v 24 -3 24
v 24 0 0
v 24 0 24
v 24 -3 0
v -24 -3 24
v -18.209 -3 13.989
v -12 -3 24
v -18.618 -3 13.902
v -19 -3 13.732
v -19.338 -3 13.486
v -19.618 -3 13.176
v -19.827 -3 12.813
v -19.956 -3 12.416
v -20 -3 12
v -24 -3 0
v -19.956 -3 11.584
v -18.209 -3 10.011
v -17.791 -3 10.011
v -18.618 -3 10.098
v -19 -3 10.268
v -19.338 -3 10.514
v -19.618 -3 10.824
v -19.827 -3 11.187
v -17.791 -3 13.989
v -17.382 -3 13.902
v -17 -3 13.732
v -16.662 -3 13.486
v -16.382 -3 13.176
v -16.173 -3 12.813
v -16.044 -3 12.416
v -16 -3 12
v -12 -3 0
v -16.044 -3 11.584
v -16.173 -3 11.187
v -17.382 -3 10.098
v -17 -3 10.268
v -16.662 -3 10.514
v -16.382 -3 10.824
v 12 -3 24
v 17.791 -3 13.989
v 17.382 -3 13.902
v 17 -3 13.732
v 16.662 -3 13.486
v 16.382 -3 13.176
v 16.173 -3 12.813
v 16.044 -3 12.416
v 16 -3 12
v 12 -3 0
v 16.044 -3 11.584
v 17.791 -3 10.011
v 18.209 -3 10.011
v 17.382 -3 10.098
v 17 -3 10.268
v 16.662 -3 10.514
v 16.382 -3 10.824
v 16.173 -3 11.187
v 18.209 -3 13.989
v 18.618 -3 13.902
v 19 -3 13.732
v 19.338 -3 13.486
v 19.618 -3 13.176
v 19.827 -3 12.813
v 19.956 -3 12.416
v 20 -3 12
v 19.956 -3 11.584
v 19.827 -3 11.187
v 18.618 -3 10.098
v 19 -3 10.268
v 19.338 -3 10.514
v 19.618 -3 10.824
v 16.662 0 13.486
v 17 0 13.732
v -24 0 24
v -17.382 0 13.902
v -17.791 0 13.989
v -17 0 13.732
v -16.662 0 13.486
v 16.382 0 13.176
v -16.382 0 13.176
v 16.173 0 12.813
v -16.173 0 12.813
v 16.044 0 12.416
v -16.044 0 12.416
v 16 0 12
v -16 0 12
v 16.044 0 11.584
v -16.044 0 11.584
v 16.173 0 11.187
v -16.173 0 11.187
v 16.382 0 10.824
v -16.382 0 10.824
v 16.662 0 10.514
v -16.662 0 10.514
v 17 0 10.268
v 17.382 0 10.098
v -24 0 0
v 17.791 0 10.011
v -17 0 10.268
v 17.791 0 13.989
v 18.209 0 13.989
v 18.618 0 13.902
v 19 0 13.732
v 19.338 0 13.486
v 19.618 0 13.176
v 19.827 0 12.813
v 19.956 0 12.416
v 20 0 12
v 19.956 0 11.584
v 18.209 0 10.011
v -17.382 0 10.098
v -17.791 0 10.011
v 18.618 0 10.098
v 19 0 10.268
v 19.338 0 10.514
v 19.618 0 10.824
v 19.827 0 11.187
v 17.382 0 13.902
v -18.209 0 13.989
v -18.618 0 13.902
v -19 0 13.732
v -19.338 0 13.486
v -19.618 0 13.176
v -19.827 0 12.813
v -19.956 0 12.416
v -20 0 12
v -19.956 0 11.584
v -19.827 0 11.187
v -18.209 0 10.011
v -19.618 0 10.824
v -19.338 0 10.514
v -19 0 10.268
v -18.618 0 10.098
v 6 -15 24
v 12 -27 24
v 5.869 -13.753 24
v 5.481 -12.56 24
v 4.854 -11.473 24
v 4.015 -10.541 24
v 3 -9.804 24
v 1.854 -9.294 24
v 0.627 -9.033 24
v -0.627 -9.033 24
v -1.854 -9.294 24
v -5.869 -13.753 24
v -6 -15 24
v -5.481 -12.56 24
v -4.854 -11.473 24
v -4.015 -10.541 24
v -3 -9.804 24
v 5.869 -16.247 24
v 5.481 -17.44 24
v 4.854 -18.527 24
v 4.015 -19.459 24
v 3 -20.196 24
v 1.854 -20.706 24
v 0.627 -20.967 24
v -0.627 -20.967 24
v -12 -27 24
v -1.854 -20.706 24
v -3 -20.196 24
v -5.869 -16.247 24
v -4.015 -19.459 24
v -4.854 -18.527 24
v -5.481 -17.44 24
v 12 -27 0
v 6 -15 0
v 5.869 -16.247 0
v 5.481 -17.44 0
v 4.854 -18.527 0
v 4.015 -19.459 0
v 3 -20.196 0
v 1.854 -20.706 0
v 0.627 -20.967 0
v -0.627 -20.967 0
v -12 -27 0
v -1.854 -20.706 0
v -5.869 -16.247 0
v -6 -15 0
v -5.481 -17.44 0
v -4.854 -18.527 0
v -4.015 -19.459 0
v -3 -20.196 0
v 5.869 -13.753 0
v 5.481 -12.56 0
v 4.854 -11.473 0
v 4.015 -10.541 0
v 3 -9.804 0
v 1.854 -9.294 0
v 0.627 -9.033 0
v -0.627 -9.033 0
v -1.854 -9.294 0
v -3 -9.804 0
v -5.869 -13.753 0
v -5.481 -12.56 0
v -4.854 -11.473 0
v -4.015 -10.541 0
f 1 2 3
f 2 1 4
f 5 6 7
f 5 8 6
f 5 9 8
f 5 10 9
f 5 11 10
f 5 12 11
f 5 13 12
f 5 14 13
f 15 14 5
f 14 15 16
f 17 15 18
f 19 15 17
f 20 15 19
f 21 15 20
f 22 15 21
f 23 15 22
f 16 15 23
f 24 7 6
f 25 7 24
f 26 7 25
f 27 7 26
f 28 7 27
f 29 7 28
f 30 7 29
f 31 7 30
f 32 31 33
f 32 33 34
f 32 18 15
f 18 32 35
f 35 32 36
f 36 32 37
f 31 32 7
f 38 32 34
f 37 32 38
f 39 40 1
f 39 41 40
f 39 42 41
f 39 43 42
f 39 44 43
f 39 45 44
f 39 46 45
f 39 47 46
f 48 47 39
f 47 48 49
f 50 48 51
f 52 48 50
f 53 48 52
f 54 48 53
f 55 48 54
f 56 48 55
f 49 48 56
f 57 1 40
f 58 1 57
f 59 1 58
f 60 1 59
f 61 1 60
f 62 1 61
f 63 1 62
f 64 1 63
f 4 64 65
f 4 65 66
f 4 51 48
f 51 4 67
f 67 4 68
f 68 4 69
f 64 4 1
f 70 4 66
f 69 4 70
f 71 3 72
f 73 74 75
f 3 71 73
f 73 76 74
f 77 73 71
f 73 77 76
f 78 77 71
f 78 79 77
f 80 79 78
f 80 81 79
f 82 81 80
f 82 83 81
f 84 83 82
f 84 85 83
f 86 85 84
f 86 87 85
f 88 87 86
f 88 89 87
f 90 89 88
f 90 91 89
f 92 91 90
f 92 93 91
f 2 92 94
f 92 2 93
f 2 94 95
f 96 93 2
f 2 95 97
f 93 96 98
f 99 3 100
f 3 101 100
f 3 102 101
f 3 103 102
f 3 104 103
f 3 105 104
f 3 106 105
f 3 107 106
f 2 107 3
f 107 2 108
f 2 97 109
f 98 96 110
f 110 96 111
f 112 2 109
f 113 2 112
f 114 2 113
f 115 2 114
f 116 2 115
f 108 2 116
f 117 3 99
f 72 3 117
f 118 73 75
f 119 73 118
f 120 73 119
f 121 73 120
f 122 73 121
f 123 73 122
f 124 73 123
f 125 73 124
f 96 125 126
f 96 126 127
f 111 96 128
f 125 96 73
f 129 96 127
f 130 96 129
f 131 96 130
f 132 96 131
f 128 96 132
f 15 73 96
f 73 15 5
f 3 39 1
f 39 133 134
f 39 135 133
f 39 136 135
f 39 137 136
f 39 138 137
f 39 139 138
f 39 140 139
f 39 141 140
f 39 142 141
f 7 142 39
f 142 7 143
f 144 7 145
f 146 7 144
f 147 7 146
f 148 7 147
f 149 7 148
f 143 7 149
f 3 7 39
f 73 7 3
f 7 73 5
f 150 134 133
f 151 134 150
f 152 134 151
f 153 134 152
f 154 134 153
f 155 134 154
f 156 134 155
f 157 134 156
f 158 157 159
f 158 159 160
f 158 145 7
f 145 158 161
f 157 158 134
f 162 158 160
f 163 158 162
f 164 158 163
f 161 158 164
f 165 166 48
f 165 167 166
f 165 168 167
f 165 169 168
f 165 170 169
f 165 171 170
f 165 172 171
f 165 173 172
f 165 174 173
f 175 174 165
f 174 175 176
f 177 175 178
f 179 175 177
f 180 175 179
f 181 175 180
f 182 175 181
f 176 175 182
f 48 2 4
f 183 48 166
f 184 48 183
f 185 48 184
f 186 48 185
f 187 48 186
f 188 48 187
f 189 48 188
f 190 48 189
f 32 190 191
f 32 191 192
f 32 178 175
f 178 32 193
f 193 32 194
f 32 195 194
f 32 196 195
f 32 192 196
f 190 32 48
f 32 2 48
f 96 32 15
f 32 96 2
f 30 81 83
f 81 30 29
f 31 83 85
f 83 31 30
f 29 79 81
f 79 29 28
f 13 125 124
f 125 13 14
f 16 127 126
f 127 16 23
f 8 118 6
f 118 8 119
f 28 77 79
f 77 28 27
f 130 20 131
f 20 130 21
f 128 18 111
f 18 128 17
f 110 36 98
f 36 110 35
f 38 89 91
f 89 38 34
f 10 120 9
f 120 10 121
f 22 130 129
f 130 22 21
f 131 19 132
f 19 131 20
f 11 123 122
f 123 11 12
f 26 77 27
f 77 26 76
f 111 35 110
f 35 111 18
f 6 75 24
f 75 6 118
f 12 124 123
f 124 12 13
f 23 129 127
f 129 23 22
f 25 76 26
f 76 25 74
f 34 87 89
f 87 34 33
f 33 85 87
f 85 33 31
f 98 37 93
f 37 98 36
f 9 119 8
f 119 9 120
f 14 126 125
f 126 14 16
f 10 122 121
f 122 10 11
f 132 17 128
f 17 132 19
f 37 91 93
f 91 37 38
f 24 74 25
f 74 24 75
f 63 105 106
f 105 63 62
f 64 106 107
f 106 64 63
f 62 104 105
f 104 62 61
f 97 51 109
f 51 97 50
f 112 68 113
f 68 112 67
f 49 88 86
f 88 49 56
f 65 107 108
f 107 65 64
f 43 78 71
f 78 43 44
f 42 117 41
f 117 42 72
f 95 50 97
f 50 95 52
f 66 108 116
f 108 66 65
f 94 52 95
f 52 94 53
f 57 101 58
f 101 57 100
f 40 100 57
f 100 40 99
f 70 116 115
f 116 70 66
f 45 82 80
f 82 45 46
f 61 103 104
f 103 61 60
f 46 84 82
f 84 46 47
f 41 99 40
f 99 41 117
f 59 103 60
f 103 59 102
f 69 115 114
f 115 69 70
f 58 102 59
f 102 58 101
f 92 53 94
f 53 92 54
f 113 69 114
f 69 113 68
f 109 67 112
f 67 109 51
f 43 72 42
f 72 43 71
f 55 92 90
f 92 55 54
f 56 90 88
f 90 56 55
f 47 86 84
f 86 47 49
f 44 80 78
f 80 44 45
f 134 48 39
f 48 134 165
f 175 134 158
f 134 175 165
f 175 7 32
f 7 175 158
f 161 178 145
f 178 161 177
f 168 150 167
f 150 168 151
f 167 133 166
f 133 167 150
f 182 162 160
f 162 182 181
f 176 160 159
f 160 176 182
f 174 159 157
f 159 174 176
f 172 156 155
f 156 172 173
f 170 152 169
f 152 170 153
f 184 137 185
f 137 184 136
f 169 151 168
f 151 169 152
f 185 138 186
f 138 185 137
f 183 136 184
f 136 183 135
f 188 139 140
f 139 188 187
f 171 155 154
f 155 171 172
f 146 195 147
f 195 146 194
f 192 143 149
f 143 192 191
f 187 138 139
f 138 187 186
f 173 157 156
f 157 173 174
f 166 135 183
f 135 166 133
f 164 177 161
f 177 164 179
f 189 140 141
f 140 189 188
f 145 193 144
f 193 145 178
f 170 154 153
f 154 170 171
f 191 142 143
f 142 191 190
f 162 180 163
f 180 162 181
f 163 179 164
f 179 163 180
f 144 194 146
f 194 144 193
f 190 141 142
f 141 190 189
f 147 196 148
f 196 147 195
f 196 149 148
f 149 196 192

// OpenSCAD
// file: common.scad
/*--------------------------------------------------------------------------*
* Sizes and common routines for the CNC parts
*---------------------------------------------------------------------------*
* 13-Jul-2014 ShaneG
*
* First set of definitions using the components I have to experiment with.
*--------------------------------------------------------------------------*/

//---------------------------------------------------------------------------
// Common definitions
//---------------------------------------------------------------------------

RESOLUTION  = 0.1; // Resolution of your printer

PANEL_DEPTH = 3.0; // The prefered size of any shell material

BOLT_SIZE = 4.0; // Diameter of connecting bolts (M4)

BED_TO_MOUNT = 15.0;

GUIDE_ROD_DIAMETER = 12.00;

BEARING_DIAMETER = 22.00;
BEARING_HEIGHT   = 7.00;

//---------------------------------------------------------------------------
// Nuts
//---------------------------------------------------------------------------

/* Hex Nut
**
** Dimensios for a hex nut. The 'outer' diameter (ie: straight side to
** parallel straight side) of the nut does not seem very consistent -
** measurements indicate a 0.5mm range of error across nuts.
*/

NUT_OUTER_DIAMETER = 13.00;
NUT_INNER_DIAMETER = 8.50;  // Enough room for the bore and thread
NUT_HEIGHT         = 6;

/** Create a hexagon.
 *
 * The 'length' parameter specifies the distance from the center of the
 * hexagon to the center of one of the six straight edges. The 'depth'
 * parameter specifies the size in the Z axis. The resulting object
 * is centered on the origin.
 */
module hexagon(length, depth = 2) {
  width = 2 * length * tan(30);
  union() {
    cube(size = [ length * 2, width, depth ], center = true);
    rotate(a = [ 0, 0, 60 ]) {
      cube(size = [ length * 2, width, depth ], center = true);
      }
    rotate(a = [ 0, 0, -60 ]) {
      cube(size = [ length * 2, width, depth ], center = true);
      }
    }
  }

/** Create a hex nut object
 *
 * This function creates a hex nut (centered on the origin) that contains a
 * hole through the center.
 */
module hexnut(depth = NUT_HEIGHT) {
  difference() {
    hexagon(NUT_OUTER_DIAMETER / 2, depth);
    cylinder(h = 2 * depth, r = NUT_INNER_DIAMETER / 2, center = true, $fs = RESOLUTION);
    }
  }

/** Create a negative hex nut object
 *
 * This function creates a hex nut (centered on the origin) that can be subtracted
 * from another shape to allow a hole for the nut to fit into.
 */
module hexnut_negative(depth = NUT_HEIGHT, spindle = NUT_HEIGHT) {
  union() {
    hexagon(NUT_OUTER_DIAMETER / 2, depth);
    cylinder(h = max(2 * depth, spindle), r = NUT_INNER_DIAMETER / 2, center = true, $fs = RESOLUTION);
    }
  }
// main file
/*--------------------------------------------------------------------------*
* X dimension mount connectors
*---------------------------------------------------------------------------*
* 13-Jul-2014 ShaneG
*
* The connector in the X dimension
*--------------------------------------------------------------------------*/
include <common.scad>;

//--- Common definitions
STEM_WIDTH  = GUIDE_ROD_DIAMETER * 2; // Width (in X) of the stem
STEM_HEIGHT = GUIDE_ROD_DIAMETER * 2; // Height (in Y) of the stem
STEM_DEPTH  = BED_TO_MOUNT + GUIDE_ROD_DIAMETER;

//---------------------------------------------------------------------------
// Helper modules
//---------------------------------------------------------------------------

/** Create the base
 *
 * The base needs to provide enough space for two connecting bolts and a
 * stem. The resulting object is centered around the Z axis and vertical
 * based at Z = 0.
 */
module baseplate() {
  plate_width = STEM_WIDTH + (6 * BOLT_SIZE);
  plate_height = max(STEM_HEIGHT, 3 * BOLT_SIZE);
  difference() {
    // Create the base plate
    translate(v = [ 0, 0, PANEL_DEPTH / 2 ]) {
      cube(size = [ plate_width, plate_height, PANEL_DEPTH ], center = true);
      }
    // Cut holes for the bolts
    translate(v = [ -((plate_width / 2) - (1.5 * BOLT_SIZE)), 0, 0 ]) {
      cylinder(h = PANEL_DEPTH * 4, r = BOLT_SIZE / 2, center = true, $fs = RESOLUTION);
      }
    translate(v = [ (plate_width / 2) - (1.5 * BOLT_SIZE), 0, 0 ]) {
      cylinder(h = PANEL_DEPTH * 4, r = BOLT_SIZE / 2, center = true, $fs = RESOLUTION);
      }
    }
  }

/** Create the stem
 *
 * The stem is centered around the Z axis and vertically based at Z = 0. The
 * height of the stem is such that the center of the nut is BED_TO_MOUNT mm
 * from Z = 0.
 */
module stem() {
  difference() {
    translate(v = [ -STEM_WIDTH / 2, -STEM_HEIGHT / 2, 0 ]) {
      cube(size = [ STEM_WIDTH, STEM_HEIGHT, STEM_DEPTH ], center = false);
      }
    translate(v = [ 0, 0, BED_TO_MOUNT ]) {
      rotate(a = [ 90, 0, 0 ]) {
        cylinder(h = 2 * STEM_WIDTH, r = GUIDE_ROD_DIAMETER / 2, center = true, $fs = RESOLUTION);
        }
      }
    }
  }

//---------------------------------------------------------------------------
// Main shape
//---------------------------------------------------------------------------

translate(v = [ 0, 0, STEM_HEIGHT / 2 ]) {
  rotate(a = [ 90, 0, 0 ]) {
    union() {
      baseplate();
      stem();
      }
    }
  }
